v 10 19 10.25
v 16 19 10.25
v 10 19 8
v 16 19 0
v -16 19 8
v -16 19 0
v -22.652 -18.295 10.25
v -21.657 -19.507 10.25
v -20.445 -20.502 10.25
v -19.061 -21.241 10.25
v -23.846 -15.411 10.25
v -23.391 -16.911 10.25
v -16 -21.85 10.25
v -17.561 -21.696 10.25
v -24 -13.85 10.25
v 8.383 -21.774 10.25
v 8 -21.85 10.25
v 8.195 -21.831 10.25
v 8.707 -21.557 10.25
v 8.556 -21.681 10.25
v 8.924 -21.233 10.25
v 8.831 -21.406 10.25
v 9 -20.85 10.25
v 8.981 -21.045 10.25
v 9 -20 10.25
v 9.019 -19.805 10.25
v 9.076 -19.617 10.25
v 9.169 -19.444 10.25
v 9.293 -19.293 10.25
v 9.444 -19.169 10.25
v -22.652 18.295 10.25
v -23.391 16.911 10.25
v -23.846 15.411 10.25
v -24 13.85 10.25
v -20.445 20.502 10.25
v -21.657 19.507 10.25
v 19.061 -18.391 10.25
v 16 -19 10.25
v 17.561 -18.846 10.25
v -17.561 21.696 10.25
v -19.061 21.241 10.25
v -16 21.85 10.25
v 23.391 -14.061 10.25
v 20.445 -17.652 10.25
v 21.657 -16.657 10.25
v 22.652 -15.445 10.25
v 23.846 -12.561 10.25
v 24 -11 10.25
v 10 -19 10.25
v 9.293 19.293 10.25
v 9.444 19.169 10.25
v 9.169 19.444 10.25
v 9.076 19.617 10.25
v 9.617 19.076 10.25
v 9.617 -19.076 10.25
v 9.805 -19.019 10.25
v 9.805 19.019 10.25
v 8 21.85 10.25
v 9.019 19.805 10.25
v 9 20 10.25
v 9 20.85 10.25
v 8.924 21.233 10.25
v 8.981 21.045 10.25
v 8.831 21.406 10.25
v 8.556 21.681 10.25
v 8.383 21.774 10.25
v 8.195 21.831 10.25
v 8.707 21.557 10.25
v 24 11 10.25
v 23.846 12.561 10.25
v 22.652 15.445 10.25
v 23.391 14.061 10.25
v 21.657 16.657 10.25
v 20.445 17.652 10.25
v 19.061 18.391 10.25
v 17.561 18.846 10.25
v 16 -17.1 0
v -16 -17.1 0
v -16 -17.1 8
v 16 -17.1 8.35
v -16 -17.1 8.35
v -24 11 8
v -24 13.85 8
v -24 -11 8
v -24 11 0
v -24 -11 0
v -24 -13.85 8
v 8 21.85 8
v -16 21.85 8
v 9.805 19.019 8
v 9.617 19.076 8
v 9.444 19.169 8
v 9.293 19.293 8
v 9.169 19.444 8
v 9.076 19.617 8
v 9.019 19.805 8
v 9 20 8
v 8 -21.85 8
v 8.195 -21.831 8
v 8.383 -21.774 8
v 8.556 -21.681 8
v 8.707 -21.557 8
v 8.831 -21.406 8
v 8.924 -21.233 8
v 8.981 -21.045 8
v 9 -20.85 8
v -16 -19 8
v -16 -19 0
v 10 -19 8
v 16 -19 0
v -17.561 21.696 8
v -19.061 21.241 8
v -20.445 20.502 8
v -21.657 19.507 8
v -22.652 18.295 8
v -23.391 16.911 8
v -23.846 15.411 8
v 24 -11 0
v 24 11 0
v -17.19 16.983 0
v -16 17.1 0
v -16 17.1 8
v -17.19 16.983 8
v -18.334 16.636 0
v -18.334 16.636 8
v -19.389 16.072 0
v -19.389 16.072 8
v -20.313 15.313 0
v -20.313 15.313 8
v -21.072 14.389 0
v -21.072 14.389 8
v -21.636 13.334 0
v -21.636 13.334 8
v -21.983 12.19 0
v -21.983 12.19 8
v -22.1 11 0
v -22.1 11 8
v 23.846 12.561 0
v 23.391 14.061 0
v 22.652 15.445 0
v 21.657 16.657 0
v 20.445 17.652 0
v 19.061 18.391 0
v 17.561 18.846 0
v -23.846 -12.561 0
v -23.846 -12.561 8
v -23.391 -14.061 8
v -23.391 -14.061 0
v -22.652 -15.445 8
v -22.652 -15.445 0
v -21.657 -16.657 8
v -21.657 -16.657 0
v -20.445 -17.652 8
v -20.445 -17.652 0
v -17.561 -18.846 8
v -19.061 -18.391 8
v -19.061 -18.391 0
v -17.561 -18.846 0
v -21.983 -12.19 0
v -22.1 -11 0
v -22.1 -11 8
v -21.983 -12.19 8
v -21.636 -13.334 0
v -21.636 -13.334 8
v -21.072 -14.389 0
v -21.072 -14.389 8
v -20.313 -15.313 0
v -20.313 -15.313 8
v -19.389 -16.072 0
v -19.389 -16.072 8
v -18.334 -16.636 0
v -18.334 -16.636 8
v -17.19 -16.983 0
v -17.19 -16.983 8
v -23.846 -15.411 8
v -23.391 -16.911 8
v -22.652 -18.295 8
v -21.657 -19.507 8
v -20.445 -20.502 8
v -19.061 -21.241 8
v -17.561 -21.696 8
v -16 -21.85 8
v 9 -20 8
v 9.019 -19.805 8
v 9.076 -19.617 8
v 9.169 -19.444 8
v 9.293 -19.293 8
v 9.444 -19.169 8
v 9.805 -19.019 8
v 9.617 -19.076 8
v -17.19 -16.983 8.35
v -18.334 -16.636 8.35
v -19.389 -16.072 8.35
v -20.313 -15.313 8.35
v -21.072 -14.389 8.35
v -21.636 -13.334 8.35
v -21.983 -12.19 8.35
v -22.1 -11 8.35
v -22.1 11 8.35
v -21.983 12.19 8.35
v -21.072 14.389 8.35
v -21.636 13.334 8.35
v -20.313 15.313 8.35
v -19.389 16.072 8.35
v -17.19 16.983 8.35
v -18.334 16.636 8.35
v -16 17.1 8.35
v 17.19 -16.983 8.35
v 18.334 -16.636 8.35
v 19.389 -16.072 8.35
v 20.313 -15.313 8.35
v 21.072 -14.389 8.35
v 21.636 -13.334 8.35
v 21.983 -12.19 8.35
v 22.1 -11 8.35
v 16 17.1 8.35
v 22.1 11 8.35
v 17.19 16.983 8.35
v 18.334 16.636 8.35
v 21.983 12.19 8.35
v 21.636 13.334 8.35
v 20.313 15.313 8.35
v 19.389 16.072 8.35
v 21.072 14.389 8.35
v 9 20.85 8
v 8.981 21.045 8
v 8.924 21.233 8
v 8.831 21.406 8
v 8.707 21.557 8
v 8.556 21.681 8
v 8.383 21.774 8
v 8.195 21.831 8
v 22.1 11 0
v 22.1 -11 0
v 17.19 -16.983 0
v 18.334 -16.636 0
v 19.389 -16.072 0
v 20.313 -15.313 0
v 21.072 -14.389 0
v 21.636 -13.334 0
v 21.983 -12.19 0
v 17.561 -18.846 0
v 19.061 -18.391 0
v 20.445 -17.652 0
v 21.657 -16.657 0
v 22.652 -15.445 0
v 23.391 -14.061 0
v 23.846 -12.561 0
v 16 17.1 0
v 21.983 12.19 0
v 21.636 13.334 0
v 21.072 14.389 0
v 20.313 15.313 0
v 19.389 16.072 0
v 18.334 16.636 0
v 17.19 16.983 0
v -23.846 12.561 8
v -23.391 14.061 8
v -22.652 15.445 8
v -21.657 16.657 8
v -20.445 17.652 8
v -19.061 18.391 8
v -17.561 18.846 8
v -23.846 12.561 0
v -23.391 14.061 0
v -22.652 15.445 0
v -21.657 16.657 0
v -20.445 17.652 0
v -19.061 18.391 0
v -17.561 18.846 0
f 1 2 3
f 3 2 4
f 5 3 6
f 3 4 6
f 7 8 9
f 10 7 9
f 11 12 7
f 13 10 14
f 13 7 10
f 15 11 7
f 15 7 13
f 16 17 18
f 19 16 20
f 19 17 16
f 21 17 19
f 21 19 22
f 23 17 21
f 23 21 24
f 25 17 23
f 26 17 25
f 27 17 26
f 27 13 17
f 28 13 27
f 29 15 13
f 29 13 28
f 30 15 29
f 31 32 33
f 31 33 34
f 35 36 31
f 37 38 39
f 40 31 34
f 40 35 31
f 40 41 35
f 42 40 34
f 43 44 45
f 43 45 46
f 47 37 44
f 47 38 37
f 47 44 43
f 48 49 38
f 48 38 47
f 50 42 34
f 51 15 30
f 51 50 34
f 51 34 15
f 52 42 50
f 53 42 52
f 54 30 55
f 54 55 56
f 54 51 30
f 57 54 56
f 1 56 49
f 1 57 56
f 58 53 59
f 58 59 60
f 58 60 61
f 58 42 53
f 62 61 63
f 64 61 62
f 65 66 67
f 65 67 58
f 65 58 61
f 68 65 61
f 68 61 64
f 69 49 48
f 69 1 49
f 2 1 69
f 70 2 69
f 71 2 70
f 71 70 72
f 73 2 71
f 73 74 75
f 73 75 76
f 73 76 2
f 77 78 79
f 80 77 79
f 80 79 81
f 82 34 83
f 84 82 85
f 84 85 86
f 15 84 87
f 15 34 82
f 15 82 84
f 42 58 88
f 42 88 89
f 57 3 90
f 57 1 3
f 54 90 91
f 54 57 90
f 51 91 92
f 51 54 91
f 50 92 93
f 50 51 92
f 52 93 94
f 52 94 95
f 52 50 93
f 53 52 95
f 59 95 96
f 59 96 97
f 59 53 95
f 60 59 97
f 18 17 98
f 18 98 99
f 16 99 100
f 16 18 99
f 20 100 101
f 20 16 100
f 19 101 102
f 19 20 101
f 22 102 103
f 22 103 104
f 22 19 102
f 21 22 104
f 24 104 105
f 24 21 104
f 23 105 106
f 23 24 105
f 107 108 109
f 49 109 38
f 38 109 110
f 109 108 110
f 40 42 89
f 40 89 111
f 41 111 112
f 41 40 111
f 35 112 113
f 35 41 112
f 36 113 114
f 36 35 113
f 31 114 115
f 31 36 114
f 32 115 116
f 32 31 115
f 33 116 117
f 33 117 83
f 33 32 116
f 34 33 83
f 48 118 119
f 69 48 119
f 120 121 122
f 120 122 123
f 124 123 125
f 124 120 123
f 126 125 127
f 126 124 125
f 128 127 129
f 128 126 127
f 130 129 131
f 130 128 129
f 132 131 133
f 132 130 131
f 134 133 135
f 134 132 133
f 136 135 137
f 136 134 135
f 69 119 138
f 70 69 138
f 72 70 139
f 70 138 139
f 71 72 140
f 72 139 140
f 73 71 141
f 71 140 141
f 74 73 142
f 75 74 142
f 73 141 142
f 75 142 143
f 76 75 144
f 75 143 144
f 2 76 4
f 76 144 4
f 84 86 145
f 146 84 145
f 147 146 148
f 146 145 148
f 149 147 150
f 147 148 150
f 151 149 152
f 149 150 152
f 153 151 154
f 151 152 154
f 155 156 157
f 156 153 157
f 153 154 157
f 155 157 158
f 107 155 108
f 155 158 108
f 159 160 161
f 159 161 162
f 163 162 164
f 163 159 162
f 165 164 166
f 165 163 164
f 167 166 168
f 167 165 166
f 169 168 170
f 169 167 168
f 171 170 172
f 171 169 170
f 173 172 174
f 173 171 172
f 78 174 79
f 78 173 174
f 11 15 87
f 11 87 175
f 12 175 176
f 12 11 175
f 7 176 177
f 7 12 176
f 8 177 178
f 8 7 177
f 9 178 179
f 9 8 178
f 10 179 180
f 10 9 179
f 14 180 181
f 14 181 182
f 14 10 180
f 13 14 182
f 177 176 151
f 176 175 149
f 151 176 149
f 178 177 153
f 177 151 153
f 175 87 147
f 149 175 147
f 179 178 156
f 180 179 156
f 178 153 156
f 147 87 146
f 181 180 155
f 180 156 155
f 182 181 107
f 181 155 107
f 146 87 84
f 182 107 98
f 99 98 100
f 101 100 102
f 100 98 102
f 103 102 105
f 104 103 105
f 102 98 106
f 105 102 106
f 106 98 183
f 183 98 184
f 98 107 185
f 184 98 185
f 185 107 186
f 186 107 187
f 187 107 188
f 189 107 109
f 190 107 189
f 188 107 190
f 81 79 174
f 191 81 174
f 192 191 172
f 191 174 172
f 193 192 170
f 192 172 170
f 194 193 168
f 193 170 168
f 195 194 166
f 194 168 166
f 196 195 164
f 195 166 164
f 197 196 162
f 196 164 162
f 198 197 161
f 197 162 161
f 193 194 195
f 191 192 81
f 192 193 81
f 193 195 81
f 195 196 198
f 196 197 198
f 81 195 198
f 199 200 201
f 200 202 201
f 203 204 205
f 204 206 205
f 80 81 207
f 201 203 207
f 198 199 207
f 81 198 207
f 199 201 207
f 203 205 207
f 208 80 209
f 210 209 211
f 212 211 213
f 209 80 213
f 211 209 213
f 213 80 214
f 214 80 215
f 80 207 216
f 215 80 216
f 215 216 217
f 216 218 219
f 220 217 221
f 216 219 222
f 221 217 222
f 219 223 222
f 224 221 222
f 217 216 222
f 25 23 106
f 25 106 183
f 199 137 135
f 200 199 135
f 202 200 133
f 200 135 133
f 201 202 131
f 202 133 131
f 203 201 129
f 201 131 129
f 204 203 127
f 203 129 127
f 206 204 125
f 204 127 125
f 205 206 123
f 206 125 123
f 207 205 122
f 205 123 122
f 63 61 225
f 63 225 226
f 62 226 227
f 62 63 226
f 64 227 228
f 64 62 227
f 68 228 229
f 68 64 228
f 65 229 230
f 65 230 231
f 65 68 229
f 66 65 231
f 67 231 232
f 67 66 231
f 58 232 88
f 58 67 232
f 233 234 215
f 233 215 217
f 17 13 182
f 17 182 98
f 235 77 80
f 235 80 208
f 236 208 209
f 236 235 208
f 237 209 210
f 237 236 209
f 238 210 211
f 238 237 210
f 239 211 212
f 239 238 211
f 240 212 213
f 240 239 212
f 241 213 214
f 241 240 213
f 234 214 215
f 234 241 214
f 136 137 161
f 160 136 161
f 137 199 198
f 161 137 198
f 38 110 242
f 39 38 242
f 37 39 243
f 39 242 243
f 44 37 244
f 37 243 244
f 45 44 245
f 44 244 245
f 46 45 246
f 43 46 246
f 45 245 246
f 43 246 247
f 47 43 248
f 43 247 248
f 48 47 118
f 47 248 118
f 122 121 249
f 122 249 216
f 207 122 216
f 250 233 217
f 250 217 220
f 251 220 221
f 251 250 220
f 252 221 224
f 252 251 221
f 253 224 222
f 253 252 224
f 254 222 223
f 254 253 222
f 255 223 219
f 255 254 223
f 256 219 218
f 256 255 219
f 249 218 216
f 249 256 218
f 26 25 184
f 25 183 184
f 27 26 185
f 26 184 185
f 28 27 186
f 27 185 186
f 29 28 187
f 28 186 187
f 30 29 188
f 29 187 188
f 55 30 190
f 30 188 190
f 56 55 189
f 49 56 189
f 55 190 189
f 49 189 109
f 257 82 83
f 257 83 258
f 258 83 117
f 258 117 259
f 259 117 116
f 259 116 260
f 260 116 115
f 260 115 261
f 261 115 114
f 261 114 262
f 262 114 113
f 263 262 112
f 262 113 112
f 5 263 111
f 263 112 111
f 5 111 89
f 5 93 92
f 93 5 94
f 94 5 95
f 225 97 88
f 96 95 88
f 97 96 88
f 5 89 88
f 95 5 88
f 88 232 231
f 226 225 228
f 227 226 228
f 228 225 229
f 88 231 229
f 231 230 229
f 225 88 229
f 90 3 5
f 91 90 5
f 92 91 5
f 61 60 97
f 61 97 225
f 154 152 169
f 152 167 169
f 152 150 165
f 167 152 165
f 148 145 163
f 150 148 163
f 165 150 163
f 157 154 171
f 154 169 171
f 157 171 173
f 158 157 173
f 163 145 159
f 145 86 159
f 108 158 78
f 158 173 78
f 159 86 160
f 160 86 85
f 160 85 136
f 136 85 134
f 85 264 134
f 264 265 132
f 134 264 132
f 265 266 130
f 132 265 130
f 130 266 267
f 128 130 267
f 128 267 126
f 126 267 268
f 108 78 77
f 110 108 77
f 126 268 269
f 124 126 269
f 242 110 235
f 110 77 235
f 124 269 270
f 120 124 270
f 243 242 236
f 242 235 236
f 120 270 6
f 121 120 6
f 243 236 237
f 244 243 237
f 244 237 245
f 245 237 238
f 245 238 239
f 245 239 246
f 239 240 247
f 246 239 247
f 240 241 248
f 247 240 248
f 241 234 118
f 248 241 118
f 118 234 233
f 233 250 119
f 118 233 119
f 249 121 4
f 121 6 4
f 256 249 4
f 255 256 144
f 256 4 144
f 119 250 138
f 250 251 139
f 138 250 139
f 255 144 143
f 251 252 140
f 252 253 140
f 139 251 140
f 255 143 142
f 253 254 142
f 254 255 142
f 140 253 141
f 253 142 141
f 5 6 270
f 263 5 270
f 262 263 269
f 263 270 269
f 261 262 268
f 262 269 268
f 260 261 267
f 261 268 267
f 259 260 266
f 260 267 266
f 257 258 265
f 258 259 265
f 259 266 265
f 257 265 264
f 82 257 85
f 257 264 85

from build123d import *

# Parameters (mm, degrees)
F1_DEPTH     = 10.25
F3_DEPTH     = 2.25
F4_R         = 1
F5_T         = 1.9
F5_T3_DEPTH  = 4.8
F5_T5_DEPTH  = 28.8
F5_T8_ANGLE  = 90.000000001
F5_T10_ANGLE = 90.000000001


# Not quite as in the source:
# - a shell that OpenCascade refuses in one call is made with other operations: the cavity is built on its own and cut out


with BuildPart() as f1:
    # F0 (on Top) → F1 (new body)
    with BuildSketch(Plane.XY):
        with BuildLine():
            ThreePointArc((24, 11), (21.6568542495, 16.6568542495), (16, 19))
            Line((16, 19), (-16, 19))
            ThreePointArc((-16, 19), (-21.6568542495, 16.6568542495), (-24, 11))
            Line((-24, 11), (-24, -11))
            ThreePointArc((-24, -11), (-21.6568542495, -16.6568542495), (-16, -19))
            Line((-16, -19), (16, -19))
            ThreePointArc((16, -19), (21.6568542495, -16.6568542495), (24, -11))
            Line((24, -11), (24, 11))
        make_face()
    extrude(amount=F1_DEPTH)

    # F2 (on face) → F3 (join)
    with BuildSketch(Plane.XY.offset(10.25)):
        with BuildLine():
            Line((8, 21.85), (-16, 21.85))
            ThreePointArc((-16, 21.85), (-21.6568542495, 19.5068542495), (-24, 13.85))
            Line((-24, 13.85), (-24, -13.85))
            ThreePointArc((-24, -13.85), (-21.6568542495, -19.5068542495), (-16, -21.85))
            Line((-16, -21.85), (8, -21.85))
            ThreePointArc((8, -21.85), (8.7071067812, -21.5571067812), (9, -20.85))
            Line((9, -20.85), (9, 20.85))
            ThreePointArc((9, 20.85), (8.7071067812, 21.5571067812), (8, 21.85))
        make_face()
    extrude(amount=-F3_DEPTH)

    # F4
    f4_edges = [f1.edges().sort_by_distance(p)[0] for p in [
        (9, -19, 9.125),
        (9, 19, 9.125),
    ]]
    fillet(f4_edges, radius=F4_R)

    # F5: shell of thickness 1.9, made by hand


with BuildPart() as f5_core1:
    # F5_t2: copy of F1
    add(f1.part)

    # the walls: a layer under each face that stays
    f5_faces = [f5_core1.faces().sort_by_distance(p)[0] for p in [
        (0, 0, 10.25),
        (0, 19, 5.125),
        (9.2928932188, 19.2928932188, 9.125),
        (21.6568542495, 16.6568542495, 5.125),
        (9, 20.425, 9.125),
        (24, 0, 5.125),
        (21.6568542495, -16.6568542495, 5.125),
        (-4, 21.85, 9.125),
        (0, -19, 5.125),
        (-21.6568542495, 19.5068542495, 9.125),
        (9.2928932188, -19.2928932188, 9.125),
        (-24, 0, 5.125),
        (9, -20.425, 9.125),
        (-21.6568542495, -19.5068542495, 9.125),
        (-4, -21.85, 9.125),
        (-18.3333333333, 20.0416666667, 8),
        (-21.6568542495, 16.6568542495, 4),
        (-18.3333333333, -20.0416666667, 8),
        (-21.6568542495, -16.6568542495, 4),
    ]]
    thicken(f5_faces, amount=-F5_T, mode=Mode.SUBTRACT)

    # F5_s4 → F5_t3 (cut)
    with BuildSketch(Plane.YZ.offset(7.1)):
        Polygon((19.019, 7.981), (17.1, 8), (17.1, 9.9), (19, 9.9), align=None)
        Polygon((-19.019, 7.981), (-17.1, 8), (-17.1, 9.9), (-19, 9.9), align=None)
    extrude(amount=F5_T3_DEPTH, mode=Mode.SUBTRACT)

    # F5_s6 → F5_t5 (cut)
    with BuildSketch(Plane.YZ.offset(-17.9)):
        Polygon((19.019, 7.981), (17.1, 8), (17.1, 9.9), (19, 9.9), align=None)
        Polygon((-19.019, 7.981), (-17.1, 8), (-17.1, 9.9), (-19, 9.9), align=None)
    extrude(amount=F5_T5_DEPTH, mode=Mode.SUBTRACT)

    # F5_s7 → F5_t8 (revolve, cut)
    with BuildSketch(Plane.XZ.offset(-11)):
        Polygon((-24.019, 7.981), (-24, 9.9), (-22.1, 9.9), (-22.1, 8), align=None)
    revolve(axis=Axis((-16, 11, 8), (0, 0, -1)), revolution_arc=F5_T8_ANGLE, mode=Mode.SUBTRACT)

    # F5_s9 → F5_t10 (revolve, cut)
    with BuildSketch(Plane.YZ.offset(-16)):
        Polygon((-19.019, 7.981), (-19, 9.9), (-17.1, 9.9), (-17.1, 8), align=None)
    revolve(axis=Axis((-16, -11, 8), (0, 0, -1)), revolution_arc=F5_T10_ANGLE, mode=Mode.SUBTRACT)


with BuildPart() as f1_1:
    add(f1.part)

    # what is left inside the walls is the cavity
    f5_cavity = [f5_core1.part.solids().sort_by_distance(p)[0] for p in [
        (0, -5.7, 8.331),
    ]]
    add(f5_cavity, mode=Mode.SUBTRACT)


solid = f1_1.part
